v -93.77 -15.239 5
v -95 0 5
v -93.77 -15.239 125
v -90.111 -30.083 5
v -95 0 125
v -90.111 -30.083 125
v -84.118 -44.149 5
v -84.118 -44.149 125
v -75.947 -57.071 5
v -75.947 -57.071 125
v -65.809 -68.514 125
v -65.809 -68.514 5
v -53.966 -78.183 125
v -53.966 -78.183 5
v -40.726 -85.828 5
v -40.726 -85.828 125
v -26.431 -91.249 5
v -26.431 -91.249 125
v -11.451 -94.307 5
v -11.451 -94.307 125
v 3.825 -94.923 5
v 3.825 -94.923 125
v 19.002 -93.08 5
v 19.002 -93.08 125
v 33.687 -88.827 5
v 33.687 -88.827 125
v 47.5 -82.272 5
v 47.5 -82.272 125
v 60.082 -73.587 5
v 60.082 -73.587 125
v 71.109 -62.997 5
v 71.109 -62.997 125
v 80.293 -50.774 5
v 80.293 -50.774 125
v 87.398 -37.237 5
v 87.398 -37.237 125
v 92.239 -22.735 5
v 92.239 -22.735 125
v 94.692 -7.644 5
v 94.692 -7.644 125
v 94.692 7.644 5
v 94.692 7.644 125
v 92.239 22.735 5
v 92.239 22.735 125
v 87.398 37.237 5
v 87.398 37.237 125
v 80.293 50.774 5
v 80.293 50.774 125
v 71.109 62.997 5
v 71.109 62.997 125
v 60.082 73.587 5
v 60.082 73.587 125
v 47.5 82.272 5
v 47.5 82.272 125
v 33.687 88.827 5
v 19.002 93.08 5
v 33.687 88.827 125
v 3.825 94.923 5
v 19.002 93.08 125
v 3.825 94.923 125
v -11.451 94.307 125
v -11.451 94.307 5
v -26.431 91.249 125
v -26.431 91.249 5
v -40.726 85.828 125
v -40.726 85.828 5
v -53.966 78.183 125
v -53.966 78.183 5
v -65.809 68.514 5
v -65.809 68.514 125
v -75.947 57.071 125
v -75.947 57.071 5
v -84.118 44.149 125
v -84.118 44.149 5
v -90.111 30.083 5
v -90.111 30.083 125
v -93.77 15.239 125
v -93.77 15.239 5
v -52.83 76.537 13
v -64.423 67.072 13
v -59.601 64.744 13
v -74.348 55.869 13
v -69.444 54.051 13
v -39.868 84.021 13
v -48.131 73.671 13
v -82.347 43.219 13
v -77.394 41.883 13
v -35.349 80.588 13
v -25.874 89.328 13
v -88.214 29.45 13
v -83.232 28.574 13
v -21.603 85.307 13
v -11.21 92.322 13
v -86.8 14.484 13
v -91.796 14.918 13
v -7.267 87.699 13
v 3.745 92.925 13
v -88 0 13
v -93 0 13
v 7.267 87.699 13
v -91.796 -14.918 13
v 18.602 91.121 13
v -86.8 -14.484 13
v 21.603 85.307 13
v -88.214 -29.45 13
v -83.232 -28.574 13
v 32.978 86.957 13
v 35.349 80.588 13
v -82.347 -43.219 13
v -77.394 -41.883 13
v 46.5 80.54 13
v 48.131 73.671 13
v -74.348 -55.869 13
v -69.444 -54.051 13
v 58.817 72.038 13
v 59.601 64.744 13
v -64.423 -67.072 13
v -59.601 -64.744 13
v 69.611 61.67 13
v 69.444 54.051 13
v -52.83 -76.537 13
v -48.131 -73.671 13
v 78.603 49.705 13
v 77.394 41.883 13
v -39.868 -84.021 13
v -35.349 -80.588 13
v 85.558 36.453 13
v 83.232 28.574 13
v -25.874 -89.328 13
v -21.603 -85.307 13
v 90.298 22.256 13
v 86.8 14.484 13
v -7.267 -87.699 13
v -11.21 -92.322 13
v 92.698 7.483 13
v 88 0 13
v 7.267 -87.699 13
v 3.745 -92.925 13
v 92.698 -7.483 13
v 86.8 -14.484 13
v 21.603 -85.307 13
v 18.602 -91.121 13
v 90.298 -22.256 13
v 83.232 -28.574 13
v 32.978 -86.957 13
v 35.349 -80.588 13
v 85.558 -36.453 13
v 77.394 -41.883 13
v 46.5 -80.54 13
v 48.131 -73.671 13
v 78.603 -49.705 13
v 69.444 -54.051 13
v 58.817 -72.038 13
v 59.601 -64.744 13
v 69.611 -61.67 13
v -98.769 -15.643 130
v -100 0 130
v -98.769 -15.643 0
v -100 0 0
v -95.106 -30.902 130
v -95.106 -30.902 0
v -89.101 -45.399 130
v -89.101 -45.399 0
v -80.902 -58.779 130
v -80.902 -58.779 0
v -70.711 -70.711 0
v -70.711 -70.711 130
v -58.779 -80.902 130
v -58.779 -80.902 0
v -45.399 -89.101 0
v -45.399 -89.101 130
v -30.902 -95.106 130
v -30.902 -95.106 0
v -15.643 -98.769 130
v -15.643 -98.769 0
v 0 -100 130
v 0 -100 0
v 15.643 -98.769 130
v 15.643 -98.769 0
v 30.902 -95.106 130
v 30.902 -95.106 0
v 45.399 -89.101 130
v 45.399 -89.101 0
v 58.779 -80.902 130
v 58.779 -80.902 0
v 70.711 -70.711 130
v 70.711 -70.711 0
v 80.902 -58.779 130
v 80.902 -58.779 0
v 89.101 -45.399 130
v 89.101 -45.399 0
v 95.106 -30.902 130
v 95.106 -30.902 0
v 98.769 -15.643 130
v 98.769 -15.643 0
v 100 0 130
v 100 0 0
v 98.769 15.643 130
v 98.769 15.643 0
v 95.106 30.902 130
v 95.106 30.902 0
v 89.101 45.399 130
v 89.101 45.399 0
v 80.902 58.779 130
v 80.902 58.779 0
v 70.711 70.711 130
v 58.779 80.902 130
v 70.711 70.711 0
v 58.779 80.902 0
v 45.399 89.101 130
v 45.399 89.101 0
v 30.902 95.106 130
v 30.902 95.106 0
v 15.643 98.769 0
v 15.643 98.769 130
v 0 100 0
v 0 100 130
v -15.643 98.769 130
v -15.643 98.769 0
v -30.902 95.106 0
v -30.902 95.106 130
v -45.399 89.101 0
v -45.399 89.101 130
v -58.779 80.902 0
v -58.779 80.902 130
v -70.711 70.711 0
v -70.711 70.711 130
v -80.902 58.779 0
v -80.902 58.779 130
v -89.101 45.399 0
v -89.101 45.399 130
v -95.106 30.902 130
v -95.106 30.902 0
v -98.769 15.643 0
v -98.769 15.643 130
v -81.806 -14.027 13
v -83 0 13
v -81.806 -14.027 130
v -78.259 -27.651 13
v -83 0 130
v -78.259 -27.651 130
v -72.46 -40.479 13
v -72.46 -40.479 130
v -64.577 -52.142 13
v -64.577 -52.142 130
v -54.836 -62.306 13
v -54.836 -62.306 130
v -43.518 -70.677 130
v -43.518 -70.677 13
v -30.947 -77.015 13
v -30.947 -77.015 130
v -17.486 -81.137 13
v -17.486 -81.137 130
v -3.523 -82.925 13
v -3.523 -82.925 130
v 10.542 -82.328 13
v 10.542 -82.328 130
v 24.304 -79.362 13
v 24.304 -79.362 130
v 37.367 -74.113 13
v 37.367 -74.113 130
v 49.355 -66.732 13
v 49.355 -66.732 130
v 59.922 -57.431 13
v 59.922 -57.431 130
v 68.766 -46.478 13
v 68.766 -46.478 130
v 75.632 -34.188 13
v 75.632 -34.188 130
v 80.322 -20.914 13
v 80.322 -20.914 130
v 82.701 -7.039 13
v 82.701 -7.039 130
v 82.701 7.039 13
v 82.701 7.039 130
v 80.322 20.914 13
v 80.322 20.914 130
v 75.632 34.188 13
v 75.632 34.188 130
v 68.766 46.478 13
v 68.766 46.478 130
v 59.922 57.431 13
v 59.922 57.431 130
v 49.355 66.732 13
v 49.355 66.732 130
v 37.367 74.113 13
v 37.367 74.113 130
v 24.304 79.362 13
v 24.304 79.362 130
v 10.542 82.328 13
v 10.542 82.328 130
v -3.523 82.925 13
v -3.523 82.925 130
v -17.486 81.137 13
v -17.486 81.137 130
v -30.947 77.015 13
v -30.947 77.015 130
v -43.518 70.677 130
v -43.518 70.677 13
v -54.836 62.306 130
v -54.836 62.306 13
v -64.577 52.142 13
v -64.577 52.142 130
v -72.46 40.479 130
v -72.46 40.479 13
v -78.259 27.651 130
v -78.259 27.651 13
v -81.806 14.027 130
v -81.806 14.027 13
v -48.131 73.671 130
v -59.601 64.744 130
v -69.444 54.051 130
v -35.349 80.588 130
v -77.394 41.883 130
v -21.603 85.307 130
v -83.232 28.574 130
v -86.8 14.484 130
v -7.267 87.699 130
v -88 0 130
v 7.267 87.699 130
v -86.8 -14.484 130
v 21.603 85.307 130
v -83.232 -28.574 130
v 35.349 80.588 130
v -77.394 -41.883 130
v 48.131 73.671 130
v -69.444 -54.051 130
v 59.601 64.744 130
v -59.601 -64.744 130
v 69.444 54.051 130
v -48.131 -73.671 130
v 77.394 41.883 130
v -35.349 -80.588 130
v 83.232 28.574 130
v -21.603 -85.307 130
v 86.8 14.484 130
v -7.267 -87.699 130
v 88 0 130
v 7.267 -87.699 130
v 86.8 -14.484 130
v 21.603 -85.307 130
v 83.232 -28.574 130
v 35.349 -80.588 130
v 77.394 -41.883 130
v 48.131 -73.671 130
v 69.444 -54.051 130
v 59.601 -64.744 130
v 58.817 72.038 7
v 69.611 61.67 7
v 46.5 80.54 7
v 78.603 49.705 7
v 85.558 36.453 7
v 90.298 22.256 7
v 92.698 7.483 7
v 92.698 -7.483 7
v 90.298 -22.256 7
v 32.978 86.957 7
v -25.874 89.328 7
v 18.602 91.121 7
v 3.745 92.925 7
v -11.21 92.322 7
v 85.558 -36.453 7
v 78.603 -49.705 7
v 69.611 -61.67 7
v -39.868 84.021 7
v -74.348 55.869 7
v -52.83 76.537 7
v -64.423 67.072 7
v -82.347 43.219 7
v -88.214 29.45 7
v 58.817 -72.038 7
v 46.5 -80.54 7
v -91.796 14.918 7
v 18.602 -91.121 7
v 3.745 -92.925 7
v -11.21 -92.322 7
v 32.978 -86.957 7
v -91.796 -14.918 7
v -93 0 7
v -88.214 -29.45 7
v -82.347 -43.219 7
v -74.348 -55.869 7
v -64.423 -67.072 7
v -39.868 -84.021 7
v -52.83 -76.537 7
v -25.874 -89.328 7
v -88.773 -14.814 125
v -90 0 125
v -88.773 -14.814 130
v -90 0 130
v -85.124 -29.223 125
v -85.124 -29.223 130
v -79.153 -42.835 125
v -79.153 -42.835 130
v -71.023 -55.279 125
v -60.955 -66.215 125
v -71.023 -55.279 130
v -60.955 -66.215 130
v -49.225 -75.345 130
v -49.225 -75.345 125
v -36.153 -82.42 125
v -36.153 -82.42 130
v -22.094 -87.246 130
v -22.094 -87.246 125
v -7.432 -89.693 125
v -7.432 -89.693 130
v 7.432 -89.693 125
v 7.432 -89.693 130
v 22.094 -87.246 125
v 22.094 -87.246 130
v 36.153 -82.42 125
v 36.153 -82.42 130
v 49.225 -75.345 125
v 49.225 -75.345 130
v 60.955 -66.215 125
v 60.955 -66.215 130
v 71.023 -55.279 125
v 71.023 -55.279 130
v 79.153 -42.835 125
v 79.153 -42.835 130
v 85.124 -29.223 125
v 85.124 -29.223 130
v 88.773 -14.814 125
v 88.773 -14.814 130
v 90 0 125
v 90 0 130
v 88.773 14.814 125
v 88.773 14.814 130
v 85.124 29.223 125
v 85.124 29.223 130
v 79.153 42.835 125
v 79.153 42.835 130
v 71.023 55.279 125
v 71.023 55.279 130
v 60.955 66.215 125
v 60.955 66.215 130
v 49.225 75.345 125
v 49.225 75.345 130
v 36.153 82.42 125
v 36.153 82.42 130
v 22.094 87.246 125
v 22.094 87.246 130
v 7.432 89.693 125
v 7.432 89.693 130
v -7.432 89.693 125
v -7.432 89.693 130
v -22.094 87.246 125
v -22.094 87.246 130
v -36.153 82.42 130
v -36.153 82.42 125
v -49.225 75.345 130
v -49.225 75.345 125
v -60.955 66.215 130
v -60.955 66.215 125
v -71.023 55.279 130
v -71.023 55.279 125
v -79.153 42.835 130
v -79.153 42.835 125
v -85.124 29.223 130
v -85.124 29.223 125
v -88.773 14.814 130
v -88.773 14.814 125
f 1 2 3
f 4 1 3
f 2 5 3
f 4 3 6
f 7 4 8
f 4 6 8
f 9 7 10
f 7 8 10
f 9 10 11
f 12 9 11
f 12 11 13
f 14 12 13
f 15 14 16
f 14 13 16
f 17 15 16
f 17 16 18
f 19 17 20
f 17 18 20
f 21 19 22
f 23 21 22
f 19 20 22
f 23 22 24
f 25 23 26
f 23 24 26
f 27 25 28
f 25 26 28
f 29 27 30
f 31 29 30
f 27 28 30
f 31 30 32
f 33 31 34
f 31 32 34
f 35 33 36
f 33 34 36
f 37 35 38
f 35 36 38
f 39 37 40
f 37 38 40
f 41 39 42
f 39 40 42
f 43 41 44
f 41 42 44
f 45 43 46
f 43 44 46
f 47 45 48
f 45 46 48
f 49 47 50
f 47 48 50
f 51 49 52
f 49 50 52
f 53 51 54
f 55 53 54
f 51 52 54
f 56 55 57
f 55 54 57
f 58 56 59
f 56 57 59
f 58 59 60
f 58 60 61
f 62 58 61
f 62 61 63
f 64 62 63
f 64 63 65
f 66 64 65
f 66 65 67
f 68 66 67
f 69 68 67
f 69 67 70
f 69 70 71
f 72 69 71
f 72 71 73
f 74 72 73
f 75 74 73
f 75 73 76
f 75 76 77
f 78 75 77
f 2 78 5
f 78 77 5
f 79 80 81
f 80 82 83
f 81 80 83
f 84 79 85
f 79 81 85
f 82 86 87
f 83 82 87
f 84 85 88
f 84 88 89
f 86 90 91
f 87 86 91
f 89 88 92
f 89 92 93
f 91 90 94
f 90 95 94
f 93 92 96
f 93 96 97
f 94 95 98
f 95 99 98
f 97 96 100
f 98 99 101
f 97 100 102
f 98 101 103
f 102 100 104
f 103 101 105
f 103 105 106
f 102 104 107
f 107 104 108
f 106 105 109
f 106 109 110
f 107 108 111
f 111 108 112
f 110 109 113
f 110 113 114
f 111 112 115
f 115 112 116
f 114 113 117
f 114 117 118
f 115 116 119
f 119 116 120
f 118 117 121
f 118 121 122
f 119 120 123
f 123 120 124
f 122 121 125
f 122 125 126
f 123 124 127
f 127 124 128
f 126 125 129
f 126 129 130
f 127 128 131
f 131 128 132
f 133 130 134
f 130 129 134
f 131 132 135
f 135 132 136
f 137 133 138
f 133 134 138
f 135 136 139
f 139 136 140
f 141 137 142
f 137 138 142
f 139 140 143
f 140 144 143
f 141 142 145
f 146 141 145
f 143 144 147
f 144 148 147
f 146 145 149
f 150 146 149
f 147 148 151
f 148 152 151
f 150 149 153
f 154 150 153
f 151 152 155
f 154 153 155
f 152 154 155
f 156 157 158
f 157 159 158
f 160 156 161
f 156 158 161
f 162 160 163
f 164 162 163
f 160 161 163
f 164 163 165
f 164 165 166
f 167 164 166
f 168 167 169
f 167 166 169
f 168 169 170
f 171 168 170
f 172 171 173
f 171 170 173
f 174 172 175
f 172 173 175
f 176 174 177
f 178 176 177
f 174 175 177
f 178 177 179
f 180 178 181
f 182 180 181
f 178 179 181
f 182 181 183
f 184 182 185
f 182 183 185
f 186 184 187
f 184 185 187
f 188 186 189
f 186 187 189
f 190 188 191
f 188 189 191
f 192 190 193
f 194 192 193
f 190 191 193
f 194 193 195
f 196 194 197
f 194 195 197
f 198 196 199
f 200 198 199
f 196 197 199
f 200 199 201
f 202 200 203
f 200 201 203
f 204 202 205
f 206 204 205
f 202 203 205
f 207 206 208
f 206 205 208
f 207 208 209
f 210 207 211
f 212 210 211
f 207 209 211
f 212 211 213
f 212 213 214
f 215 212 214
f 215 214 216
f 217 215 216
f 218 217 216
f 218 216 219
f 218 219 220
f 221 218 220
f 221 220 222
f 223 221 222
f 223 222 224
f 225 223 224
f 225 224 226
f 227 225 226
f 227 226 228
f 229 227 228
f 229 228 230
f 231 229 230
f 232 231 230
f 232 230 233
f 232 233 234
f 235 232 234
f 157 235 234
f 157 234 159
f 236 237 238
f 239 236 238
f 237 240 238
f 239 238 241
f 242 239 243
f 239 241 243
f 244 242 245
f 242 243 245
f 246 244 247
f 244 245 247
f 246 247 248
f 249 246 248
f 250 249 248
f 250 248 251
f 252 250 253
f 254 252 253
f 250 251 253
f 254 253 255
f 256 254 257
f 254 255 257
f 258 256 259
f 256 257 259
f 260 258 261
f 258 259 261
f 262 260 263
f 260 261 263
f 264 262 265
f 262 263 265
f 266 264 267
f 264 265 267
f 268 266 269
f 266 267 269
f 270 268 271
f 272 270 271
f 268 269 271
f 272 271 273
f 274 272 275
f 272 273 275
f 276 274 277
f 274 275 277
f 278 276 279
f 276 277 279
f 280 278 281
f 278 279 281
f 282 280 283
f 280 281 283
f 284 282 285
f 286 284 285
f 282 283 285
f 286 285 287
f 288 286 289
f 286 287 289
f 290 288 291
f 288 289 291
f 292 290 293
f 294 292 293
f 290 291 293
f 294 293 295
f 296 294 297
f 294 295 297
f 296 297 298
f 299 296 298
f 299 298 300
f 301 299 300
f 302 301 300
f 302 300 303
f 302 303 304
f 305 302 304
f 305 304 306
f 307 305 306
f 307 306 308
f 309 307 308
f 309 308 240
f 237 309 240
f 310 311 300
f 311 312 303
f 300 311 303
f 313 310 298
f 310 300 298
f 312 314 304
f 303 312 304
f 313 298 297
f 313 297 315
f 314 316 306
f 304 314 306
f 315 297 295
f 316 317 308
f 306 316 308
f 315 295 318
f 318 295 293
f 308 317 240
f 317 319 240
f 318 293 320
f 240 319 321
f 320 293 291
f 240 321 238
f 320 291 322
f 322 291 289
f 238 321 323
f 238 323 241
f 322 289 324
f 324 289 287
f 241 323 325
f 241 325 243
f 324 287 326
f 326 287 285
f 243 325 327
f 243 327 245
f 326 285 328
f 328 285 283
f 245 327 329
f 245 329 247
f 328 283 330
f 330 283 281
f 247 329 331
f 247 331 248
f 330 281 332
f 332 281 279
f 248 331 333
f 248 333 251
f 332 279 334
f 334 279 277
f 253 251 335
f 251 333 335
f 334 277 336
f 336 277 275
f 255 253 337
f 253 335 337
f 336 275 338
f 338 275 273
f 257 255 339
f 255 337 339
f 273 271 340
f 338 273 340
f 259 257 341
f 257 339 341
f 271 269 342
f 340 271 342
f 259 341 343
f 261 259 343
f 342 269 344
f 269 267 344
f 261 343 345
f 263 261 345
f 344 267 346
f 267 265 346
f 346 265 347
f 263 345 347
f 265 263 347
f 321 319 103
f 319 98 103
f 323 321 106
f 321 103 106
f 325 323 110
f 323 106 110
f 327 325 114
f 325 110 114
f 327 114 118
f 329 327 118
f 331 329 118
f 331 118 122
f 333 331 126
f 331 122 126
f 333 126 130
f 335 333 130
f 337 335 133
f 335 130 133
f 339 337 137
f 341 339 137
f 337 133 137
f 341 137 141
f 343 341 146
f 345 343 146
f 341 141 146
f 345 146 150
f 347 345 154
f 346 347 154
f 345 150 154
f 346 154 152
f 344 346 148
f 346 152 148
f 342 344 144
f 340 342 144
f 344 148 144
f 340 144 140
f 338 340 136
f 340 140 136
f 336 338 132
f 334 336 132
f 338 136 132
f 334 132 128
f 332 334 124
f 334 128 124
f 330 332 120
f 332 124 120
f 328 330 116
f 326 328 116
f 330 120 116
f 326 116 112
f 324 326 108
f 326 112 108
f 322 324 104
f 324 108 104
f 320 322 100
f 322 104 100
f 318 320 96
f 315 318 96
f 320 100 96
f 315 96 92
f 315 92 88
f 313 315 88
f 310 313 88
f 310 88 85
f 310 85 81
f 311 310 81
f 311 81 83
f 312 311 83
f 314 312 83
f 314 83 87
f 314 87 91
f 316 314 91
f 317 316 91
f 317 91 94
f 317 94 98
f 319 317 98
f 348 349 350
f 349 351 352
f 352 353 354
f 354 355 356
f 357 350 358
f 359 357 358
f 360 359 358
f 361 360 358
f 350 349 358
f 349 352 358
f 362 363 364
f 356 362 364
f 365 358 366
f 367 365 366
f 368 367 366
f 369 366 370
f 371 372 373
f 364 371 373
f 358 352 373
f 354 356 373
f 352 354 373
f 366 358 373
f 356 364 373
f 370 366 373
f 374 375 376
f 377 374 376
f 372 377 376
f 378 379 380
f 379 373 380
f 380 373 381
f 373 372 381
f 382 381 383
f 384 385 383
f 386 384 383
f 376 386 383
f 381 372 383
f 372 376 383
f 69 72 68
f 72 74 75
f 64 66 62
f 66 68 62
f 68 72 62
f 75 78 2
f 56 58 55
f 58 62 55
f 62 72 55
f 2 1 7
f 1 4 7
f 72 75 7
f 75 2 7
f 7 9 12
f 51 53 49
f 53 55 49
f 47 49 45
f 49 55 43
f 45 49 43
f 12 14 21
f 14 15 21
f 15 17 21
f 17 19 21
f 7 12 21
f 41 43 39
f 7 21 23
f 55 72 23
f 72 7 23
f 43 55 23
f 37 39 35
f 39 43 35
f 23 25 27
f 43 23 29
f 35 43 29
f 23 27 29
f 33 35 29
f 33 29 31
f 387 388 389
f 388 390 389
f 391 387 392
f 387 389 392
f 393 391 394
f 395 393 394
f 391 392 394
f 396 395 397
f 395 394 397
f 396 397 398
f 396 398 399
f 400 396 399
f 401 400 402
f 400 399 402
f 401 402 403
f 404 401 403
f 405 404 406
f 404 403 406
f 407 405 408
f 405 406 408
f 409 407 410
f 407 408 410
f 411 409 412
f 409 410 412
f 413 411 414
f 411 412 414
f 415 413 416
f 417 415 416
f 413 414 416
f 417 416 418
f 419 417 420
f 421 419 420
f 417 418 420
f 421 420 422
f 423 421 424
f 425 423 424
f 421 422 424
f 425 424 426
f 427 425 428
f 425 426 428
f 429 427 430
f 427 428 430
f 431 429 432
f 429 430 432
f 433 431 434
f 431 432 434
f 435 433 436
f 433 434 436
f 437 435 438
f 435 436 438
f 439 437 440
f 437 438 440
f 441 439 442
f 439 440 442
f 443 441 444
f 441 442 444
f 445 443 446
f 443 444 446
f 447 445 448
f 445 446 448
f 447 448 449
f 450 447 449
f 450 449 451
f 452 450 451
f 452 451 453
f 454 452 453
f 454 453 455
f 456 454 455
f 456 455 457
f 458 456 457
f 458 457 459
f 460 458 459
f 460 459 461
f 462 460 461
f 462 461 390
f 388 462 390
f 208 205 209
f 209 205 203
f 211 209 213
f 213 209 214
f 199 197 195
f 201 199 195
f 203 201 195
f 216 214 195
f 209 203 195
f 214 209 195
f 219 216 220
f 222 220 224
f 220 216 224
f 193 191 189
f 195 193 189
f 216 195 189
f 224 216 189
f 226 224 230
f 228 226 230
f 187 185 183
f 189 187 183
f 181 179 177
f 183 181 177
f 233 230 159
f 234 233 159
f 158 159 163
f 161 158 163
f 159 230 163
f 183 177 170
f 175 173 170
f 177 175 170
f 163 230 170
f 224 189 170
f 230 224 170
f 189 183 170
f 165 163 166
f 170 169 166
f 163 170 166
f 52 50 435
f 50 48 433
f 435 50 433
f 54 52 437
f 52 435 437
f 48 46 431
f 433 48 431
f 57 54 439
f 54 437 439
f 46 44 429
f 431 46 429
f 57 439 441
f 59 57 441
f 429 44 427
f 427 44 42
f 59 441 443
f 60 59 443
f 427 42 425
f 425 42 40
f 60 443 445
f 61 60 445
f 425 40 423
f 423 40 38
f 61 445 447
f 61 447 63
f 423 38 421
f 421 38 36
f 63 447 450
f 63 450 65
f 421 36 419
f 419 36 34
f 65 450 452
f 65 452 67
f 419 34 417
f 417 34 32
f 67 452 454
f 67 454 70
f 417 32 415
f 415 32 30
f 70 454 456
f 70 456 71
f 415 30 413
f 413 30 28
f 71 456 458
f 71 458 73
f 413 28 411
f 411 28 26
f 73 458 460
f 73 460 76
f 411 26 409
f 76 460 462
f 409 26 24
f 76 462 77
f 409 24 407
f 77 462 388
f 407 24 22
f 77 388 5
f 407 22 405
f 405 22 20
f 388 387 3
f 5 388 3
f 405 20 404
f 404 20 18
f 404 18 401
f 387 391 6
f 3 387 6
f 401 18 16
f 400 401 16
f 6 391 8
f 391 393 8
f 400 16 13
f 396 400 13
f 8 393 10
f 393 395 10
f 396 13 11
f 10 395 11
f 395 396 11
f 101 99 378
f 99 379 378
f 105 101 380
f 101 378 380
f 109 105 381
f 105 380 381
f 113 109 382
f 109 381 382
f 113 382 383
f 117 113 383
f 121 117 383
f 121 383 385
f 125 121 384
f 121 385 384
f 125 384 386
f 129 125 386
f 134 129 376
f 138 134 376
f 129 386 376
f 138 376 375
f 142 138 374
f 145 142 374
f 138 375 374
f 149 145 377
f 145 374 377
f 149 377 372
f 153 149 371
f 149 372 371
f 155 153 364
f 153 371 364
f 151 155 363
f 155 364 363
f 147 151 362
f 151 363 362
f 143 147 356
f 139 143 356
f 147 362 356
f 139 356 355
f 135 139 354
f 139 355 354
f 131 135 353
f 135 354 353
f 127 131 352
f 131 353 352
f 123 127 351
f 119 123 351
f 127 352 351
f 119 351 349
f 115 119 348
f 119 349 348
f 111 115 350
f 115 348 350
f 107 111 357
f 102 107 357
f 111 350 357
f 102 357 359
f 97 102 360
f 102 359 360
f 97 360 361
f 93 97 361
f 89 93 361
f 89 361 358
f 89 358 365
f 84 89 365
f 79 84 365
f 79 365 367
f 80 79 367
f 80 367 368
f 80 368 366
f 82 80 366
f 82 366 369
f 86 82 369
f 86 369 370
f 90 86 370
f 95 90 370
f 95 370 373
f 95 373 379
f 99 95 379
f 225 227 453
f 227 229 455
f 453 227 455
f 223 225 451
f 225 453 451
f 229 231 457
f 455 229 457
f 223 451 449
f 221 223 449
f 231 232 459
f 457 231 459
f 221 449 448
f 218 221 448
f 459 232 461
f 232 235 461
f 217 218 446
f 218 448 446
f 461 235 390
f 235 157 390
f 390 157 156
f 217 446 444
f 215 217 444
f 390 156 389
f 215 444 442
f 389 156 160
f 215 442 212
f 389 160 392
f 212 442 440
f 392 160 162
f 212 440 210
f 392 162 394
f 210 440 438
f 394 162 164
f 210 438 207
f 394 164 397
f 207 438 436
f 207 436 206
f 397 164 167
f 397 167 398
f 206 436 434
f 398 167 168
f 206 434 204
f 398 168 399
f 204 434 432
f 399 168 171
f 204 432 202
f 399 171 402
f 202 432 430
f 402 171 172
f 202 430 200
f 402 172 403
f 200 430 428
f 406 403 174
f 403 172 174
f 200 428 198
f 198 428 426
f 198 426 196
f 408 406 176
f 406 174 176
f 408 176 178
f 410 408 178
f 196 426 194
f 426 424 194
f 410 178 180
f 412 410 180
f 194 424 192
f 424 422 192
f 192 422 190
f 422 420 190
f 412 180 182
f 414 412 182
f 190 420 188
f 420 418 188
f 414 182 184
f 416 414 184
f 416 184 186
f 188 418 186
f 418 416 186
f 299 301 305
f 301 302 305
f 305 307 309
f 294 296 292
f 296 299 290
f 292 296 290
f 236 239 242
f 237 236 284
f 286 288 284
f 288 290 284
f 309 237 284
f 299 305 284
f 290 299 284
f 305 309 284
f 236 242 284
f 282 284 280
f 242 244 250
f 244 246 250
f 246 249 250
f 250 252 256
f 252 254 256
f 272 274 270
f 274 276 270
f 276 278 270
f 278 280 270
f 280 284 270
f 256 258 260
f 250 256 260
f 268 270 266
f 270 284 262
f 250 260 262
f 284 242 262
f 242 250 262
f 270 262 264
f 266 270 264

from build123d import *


with BuildPart() as f1:
    # F0 (on Front) → F1 (revolve)
    with BuildSketch(Plane.XZ):
        Polygon((-93, 7), (0, 7), (0, 13), (-83, 13), (-83, 130), (-88, 130), (-88, 123), (-88, 13), (-93, 13), align=None)
        Polygon((-100, 0), (0, 0), (0, 5), (-95, 5), (-95, 125), (-90, 125), (-90, 130), (-100, 130), align=None)
    revolve(axis=Axis((0, 0, 65), (0, 0, 1)))


solid = f1.part
